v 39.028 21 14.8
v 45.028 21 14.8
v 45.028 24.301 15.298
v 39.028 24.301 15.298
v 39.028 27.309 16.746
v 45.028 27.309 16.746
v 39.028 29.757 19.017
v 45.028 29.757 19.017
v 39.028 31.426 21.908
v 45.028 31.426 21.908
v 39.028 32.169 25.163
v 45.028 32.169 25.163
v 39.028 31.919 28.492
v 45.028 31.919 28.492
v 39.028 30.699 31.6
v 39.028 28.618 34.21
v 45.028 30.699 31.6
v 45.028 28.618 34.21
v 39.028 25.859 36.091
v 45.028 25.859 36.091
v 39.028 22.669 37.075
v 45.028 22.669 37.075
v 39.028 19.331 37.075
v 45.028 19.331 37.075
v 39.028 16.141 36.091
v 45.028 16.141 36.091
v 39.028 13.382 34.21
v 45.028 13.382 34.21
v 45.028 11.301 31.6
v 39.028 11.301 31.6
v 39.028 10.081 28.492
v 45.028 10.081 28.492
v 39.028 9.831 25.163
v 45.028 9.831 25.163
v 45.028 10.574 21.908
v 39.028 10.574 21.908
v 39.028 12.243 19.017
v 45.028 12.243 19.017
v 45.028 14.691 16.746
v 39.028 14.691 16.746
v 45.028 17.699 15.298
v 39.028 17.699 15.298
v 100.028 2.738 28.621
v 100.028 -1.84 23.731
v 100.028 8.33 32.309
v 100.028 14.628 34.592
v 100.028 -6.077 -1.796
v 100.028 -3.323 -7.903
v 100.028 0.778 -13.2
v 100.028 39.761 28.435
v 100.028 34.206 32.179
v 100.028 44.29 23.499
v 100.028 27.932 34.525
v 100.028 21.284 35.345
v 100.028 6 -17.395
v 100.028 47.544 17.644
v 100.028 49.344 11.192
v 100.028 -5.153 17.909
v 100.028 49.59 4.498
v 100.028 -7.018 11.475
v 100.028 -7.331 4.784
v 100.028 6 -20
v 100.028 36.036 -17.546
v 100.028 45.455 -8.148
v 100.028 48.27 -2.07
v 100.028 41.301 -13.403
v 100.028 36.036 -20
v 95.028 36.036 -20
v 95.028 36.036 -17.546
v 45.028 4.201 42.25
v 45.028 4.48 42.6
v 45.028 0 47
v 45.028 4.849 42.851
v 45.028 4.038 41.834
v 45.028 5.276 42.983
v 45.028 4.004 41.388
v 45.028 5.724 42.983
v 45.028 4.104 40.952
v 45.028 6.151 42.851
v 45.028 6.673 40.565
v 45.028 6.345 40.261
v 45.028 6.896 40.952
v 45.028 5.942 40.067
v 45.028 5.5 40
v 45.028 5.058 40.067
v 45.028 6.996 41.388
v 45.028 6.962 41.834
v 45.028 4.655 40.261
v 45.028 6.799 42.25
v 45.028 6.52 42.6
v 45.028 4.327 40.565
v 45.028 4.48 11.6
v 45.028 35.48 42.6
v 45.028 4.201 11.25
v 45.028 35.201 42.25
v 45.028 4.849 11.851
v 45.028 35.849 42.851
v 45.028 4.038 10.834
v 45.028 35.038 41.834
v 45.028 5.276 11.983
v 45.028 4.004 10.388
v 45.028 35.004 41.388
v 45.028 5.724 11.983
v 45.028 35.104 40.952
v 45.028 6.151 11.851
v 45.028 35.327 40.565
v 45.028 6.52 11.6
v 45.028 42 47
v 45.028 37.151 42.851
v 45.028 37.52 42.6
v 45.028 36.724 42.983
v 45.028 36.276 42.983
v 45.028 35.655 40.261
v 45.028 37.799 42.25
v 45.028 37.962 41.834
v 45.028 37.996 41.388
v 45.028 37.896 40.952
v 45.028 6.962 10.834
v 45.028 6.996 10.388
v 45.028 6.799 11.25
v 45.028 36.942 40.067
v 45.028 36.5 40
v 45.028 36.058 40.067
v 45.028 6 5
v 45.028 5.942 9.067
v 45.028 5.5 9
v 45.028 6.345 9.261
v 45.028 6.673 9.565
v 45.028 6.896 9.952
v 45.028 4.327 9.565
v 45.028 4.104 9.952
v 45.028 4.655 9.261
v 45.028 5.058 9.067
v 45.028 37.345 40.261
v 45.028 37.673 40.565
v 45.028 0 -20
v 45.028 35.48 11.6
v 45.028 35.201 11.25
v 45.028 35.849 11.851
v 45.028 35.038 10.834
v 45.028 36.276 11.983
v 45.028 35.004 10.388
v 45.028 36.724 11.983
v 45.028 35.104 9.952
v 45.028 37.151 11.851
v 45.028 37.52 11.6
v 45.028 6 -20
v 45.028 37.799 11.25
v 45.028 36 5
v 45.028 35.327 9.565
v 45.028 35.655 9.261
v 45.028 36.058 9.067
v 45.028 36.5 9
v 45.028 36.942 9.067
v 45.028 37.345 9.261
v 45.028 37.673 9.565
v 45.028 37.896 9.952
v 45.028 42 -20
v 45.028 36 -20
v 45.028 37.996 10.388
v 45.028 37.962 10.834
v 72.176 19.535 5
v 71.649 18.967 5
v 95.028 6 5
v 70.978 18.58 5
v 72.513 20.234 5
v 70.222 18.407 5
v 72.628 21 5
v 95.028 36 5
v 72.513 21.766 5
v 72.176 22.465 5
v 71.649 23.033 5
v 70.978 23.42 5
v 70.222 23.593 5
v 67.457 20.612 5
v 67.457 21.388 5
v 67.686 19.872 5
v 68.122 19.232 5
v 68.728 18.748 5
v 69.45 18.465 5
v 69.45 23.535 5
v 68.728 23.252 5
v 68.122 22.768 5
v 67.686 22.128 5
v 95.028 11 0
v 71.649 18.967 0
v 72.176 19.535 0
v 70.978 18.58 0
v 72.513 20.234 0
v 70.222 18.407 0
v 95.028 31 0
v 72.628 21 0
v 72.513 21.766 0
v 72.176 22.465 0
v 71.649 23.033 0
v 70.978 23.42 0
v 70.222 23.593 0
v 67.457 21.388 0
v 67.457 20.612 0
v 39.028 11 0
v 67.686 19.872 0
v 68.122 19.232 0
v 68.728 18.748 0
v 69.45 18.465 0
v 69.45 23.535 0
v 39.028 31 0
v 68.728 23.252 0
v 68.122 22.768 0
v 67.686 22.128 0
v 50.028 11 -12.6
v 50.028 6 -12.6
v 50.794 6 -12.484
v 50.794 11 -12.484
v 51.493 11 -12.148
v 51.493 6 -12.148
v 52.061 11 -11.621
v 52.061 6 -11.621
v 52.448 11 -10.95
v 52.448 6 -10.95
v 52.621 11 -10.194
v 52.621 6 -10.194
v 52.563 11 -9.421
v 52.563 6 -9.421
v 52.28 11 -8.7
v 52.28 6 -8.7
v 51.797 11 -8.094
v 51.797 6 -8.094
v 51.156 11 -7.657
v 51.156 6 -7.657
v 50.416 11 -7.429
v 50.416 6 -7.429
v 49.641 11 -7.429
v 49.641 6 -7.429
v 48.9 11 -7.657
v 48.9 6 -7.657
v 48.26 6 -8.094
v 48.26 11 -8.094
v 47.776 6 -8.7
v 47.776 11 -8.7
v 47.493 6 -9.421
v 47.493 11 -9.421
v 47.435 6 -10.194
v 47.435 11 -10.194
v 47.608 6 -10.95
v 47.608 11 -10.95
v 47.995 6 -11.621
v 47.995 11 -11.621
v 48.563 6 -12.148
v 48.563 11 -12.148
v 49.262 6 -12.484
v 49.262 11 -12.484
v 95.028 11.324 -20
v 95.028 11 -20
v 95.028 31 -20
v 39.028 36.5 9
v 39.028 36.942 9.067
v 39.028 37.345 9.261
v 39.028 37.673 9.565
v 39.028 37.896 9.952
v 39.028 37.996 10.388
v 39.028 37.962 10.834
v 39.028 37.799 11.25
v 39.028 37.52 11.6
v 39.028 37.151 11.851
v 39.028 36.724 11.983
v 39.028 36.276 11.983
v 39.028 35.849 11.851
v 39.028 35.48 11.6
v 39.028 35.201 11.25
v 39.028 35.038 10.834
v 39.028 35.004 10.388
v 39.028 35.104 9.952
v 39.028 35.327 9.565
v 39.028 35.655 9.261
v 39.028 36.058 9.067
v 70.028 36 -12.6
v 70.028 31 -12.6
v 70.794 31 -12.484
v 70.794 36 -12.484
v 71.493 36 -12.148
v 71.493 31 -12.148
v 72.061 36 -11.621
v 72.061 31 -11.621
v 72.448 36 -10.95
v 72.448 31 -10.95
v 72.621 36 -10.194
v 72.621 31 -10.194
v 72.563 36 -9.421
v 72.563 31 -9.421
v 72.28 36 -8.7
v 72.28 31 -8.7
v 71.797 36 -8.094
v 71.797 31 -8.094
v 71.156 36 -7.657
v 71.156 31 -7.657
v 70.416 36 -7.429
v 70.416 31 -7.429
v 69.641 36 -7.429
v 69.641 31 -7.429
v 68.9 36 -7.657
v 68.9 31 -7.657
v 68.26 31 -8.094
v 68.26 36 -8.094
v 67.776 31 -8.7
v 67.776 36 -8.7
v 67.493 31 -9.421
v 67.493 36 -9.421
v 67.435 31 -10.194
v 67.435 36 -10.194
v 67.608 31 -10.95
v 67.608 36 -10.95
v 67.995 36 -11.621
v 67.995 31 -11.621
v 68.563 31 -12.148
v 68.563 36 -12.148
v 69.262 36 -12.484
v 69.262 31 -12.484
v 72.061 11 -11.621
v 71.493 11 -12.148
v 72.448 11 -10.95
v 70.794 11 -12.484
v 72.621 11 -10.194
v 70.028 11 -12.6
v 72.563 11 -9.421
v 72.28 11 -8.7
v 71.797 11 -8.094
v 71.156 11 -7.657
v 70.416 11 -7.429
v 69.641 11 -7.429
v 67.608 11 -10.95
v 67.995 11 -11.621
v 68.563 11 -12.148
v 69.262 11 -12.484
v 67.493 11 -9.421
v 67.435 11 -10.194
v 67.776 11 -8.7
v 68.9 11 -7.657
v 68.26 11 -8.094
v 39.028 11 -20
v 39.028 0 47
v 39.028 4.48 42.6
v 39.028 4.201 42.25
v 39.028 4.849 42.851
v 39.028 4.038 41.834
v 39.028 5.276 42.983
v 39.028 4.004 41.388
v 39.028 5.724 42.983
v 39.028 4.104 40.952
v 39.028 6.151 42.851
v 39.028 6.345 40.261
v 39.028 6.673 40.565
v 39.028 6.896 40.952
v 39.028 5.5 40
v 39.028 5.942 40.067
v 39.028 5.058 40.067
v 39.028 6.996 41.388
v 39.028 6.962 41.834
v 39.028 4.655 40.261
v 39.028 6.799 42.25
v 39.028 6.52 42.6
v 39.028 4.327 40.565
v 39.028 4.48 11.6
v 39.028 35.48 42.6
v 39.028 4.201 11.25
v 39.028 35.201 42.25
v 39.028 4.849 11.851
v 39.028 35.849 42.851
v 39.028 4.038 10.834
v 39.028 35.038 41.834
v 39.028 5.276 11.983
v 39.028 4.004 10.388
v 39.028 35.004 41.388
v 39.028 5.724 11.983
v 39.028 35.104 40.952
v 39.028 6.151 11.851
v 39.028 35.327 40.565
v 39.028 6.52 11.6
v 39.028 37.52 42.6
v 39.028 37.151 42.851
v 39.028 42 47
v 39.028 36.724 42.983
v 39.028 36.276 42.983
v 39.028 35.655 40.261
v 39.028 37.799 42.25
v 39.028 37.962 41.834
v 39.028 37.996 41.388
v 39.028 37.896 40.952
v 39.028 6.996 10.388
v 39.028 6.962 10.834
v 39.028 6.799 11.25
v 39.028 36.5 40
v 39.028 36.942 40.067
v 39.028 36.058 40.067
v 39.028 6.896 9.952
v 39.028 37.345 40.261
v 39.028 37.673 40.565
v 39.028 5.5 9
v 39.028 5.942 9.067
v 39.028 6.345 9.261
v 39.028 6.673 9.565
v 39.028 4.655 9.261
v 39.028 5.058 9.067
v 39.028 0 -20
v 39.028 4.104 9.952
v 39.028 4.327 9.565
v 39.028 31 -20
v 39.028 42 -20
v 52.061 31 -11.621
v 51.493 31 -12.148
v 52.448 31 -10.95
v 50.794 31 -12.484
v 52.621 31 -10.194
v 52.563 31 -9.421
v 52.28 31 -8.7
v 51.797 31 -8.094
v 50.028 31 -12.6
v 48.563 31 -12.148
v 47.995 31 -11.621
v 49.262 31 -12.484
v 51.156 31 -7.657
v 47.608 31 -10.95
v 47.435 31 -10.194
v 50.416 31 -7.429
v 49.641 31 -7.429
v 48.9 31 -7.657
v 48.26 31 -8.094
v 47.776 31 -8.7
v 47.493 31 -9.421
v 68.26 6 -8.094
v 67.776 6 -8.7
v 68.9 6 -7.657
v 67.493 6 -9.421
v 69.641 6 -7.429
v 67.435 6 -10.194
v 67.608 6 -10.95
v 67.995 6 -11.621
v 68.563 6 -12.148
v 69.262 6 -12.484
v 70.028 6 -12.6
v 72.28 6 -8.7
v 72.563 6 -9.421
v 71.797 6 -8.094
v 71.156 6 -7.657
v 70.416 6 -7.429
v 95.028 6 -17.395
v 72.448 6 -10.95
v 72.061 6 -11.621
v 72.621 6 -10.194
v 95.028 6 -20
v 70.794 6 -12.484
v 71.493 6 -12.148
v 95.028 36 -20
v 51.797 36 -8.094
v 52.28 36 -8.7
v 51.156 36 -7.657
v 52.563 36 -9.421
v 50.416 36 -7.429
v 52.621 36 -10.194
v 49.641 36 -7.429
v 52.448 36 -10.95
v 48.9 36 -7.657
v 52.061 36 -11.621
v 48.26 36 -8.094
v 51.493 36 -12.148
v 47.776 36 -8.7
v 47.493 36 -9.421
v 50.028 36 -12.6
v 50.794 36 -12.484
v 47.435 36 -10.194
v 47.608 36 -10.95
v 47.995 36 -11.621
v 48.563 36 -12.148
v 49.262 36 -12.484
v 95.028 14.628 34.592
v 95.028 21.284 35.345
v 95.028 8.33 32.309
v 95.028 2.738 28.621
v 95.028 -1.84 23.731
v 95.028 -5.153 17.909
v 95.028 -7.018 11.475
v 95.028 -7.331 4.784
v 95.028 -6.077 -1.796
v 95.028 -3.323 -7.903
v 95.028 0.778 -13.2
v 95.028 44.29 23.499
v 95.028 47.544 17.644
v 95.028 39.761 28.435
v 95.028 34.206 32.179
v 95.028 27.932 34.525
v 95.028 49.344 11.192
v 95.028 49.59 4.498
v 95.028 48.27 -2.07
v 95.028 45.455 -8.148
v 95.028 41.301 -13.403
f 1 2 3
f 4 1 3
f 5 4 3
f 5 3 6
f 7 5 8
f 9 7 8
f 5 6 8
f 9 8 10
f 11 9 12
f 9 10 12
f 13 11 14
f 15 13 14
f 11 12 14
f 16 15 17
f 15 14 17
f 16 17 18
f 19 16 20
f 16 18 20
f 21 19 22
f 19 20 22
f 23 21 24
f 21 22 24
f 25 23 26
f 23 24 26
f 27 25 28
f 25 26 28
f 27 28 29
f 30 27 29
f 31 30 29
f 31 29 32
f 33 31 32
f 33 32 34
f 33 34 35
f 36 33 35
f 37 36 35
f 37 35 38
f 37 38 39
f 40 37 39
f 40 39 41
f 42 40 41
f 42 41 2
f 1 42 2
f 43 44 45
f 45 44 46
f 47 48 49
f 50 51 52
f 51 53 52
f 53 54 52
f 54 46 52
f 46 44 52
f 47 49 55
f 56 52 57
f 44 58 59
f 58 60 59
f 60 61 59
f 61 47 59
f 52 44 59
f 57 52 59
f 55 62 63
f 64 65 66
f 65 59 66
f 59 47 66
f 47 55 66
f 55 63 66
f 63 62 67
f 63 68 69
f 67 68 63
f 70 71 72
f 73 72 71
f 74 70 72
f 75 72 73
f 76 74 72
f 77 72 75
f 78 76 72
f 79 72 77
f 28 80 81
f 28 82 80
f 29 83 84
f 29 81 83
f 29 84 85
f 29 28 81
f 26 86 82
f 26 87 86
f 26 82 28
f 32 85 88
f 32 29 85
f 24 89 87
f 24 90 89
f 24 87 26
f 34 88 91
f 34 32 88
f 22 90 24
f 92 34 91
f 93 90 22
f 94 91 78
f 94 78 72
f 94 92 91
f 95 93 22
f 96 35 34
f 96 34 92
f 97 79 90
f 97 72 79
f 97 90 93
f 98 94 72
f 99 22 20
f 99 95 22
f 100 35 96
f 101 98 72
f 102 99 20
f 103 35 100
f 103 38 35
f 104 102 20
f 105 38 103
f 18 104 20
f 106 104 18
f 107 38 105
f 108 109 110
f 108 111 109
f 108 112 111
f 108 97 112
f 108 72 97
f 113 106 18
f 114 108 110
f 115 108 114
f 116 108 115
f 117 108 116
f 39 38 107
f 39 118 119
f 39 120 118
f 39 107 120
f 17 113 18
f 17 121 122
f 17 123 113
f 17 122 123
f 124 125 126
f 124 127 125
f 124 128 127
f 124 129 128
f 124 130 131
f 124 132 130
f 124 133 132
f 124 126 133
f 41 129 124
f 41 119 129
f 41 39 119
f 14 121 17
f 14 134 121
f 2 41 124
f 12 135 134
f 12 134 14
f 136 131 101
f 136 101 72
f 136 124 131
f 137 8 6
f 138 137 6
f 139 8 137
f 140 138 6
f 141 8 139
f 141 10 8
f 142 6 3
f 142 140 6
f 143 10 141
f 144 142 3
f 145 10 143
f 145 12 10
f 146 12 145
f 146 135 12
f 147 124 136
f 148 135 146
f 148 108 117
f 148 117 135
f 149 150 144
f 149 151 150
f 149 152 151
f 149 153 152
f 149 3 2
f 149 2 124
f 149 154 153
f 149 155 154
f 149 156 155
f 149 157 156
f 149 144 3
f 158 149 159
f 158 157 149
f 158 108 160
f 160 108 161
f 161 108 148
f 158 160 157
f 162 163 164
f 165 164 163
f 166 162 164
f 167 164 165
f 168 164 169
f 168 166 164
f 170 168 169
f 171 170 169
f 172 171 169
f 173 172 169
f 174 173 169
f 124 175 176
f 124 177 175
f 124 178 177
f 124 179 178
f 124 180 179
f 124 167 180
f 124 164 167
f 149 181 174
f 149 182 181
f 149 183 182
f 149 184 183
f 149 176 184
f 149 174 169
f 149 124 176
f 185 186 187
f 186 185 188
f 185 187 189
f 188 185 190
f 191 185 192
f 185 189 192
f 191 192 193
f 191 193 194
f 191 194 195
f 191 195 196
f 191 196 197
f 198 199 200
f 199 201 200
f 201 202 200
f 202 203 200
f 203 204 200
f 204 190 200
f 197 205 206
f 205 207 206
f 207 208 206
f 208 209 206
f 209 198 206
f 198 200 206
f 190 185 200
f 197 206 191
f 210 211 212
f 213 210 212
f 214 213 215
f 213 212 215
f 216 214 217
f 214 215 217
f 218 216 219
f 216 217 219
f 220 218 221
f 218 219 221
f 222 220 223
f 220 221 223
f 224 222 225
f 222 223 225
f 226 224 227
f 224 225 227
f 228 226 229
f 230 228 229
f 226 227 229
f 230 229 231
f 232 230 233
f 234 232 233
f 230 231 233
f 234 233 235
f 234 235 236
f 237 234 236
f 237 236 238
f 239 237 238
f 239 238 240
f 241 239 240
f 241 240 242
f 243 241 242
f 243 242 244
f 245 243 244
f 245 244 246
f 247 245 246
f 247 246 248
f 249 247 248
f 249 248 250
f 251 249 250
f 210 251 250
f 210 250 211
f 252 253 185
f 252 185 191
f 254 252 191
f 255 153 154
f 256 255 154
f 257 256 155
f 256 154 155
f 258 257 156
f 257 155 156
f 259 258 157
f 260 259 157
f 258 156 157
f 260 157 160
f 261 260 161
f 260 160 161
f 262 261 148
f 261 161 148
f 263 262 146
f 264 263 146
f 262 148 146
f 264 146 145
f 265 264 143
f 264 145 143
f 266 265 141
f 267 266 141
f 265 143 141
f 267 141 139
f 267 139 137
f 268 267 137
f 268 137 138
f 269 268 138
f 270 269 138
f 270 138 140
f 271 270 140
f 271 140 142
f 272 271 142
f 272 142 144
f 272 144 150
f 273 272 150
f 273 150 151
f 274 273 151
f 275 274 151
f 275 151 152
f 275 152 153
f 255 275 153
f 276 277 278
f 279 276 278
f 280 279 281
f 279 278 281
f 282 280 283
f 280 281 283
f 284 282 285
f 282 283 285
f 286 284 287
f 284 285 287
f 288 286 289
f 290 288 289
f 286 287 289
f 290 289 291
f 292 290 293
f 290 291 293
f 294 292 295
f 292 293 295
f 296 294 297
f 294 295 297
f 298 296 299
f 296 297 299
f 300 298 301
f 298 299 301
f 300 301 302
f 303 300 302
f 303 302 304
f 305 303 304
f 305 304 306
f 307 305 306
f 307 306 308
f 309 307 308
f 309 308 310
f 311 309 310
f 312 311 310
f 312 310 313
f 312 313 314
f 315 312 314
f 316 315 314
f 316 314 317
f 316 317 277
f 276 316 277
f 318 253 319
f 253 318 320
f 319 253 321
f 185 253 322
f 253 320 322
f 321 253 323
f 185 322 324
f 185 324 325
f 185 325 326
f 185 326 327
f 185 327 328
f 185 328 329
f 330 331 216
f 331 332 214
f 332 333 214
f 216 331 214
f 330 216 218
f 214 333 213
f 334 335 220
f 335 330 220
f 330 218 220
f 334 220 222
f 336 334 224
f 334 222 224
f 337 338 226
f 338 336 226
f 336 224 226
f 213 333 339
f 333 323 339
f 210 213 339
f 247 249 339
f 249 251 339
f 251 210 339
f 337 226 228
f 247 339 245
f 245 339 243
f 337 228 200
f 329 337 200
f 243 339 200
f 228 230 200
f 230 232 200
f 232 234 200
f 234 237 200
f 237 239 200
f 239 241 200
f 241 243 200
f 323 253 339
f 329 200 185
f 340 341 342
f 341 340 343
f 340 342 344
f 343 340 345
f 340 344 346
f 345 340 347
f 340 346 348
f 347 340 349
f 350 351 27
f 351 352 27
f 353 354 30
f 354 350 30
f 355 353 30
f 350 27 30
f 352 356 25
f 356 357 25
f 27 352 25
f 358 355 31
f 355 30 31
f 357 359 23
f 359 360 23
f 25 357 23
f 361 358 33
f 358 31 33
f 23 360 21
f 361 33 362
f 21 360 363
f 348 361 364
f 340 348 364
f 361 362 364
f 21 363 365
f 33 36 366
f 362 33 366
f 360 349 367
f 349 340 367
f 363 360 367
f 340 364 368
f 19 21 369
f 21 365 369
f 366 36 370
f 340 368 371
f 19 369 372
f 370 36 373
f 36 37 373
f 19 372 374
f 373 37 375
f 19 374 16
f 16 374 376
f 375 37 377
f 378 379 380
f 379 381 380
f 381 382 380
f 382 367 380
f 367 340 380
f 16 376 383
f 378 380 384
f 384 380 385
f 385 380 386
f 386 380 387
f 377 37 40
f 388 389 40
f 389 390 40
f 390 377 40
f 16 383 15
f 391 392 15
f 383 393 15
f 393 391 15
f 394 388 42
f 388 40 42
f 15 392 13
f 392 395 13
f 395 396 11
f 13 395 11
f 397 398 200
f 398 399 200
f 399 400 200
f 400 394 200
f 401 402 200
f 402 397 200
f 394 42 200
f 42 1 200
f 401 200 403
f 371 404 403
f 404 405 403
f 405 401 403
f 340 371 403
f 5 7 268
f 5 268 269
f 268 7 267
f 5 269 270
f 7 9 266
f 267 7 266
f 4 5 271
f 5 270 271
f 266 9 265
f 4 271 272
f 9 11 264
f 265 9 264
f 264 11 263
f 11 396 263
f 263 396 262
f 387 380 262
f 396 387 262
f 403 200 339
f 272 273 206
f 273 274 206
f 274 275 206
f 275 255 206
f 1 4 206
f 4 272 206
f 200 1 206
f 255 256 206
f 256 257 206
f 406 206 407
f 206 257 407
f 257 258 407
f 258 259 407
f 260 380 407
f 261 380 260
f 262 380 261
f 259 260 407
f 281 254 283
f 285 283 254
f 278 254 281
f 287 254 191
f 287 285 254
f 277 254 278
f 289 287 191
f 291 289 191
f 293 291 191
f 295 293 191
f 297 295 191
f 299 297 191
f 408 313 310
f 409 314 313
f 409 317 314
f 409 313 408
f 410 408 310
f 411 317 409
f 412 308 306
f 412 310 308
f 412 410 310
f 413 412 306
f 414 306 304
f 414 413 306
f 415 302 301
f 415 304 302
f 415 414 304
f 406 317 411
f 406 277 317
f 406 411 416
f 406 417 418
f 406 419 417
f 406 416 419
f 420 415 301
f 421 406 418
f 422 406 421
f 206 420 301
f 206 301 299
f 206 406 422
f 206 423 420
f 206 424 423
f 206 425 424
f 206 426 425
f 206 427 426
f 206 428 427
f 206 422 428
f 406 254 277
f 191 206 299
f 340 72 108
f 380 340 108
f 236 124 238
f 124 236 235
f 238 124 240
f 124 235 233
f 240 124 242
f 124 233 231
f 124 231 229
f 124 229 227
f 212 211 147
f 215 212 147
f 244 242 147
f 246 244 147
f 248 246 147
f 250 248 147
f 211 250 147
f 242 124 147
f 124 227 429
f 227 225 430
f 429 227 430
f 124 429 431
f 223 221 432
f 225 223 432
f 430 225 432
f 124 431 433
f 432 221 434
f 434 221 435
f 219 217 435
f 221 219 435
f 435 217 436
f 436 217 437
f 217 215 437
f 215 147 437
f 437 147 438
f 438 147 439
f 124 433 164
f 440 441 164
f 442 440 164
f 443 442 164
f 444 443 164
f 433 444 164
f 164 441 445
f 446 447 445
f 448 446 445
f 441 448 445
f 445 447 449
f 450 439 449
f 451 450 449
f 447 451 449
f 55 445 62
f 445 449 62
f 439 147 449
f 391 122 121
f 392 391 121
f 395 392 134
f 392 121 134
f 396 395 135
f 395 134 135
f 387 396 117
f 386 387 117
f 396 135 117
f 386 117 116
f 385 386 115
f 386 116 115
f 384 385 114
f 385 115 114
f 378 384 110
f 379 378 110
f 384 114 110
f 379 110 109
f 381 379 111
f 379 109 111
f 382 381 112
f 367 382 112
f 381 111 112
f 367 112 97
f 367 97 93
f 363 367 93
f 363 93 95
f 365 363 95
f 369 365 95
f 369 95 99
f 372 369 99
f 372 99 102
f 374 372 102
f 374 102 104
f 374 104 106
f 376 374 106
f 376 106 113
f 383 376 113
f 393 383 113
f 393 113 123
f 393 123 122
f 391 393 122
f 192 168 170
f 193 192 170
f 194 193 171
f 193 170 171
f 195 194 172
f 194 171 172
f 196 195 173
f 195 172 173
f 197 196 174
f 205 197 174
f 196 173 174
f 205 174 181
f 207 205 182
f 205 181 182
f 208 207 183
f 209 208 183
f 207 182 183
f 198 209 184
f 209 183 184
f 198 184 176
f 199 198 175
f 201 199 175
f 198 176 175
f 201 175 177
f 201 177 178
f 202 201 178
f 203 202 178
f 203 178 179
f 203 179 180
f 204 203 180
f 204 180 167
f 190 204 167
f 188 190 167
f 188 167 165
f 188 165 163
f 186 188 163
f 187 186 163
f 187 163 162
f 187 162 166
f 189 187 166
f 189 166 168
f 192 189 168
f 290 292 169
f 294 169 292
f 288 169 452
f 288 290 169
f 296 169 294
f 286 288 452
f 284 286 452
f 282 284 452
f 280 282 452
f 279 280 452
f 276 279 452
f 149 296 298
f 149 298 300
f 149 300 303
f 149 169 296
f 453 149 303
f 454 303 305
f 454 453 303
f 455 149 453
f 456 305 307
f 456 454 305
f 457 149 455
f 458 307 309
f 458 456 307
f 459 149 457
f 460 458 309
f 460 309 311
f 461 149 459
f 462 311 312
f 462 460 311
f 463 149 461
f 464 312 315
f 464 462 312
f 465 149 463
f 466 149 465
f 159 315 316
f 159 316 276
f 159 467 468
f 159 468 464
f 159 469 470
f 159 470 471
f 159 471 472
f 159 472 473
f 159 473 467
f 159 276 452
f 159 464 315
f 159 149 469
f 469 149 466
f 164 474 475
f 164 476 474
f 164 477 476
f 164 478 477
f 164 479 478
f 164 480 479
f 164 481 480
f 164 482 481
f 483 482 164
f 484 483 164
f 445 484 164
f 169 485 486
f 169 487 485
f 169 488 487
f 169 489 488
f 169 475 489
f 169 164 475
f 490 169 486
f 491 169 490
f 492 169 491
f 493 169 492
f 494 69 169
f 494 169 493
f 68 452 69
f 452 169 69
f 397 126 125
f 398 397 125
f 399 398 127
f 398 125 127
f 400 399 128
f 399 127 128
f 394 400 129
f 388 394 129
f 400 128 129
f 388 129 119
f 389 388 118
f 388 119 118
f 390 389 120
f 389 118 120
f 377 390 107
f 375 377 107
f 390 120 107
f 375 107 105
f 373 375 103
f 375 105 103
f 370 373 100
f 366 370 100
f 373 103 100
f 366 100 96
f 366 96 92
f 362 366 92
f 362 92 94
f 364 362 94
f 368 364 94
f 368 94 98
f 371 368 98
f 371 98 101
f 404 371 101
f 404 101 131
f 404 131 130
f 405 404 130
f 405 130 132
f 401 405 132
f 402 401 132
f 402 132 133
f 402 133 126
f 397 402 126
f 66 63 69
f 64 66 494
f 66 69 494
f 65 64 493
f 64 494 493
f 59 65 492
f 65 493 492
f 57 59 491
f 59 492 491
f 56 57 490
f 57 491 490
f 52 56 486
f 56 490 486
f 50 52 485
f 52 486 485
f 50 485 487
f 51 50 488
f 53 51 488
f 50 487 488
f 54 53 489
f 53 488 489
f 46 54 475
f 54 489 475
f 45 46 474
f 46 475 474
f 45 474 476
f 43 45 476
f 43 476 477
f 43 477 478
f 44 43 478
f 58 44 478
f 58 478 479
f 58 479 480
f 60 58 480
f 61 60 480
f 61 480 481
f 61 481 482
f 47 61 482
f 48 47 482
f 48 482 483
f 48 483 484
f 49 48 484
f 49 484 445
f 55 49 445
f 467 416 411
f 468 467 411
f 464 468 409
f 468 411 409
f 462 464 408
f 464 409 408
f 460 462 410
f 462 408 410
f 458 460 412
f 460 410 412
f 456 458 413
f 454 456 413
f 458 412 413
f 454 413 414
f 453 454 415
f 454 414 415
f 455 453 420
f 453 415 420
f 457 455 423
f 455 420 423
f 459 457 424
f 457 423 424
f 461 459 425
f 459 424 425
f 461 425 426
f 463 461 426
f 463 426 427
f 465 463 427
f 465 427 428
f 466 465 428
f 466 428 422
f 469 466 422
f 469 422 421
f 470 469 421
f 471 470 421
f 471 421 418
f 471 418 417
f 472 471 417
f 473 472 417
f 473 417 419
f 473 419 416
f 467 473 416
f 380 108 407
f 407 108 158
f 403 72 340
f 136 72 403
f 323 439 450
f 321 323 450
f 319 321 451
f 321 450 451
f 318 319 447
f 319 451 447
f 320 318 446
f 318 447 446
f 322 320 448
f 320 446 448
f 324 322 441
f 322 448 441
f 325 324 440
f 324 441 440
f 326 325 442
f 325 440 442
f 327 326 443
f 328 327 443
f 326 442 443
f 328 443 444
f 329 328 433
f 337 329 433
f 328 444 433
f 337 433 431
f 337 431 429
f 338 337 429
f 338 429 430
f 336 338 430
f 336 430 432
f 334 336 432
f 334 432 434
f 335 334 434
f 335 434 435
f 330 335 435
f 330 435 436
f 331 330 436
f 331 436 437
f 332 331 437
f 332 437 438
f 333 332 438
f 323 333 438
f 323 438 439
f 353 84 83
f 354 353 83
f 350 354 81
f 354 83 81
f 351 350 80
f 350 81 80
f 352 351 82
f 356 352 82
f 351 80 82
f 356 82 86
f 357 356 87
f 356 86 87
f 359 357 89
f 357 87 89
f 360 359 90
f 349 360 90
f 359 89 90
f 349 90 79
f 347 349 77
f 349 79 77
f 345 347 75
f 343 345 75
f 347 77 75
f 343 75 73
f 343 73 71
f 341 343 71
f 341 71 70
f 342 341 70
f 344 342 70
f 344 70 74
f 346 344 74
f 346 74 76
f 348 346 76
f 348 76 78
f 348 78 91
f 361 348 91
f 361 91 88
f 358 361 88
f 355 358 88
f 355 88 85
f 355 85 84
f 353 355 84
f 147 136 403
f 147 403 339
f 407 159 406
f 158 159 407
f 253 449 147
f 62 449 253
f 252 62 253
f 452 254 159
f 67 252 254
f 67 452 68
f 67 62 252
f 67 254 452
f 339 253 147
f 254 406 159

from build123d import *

# Parameters (mm, degrees)
SKETCH1_W           = 67
SKETCH1_H           = 41.999999434
BOSS_EXTRUDE1_DEPTH = 6.000000983
SKETCH2_W           = 24.999999441
SKETCH2_H           = 29.999998398
BOSS_EXTRUDE2_DEPTH = 50
SKETCH3_W           = 19.999999553
SKETCH3_H           = 19.999999553
CUT_EXTRUDE1_DEPTH  = 85.314886613
SKETCH14_R          = 11.2
CUT_EXTRUDE12_DEPTH = 10
SKETCH15_R          = 2.6
CUT_EXTRUDE13_DEPTH = 112.961295121
SKETCH18_R          = 1.5
CUT_EXTRUDE14_DEPTH = 81.454956308
SKETCH19_R          = 2.6
CUT_EXTRUDE15_DEPTH = 113.063962124
SKETCH20_R          = 28.543107088
BOSS_EXTRUDE3_DEPTH = 5
BOSS_EXTRUDE4_REACH = 132.242
SKETCH21_W          = 30.03647221
SKETCH21_H          = 5
SKETCH22_W          = 8.074560758
SKETCH22_H          = 29.943227156
CUT_EXTRUDE16_DEPTH = 10


with BuildPart() as part:
    # Sketch1 → Boss-Extrude1 (new body)
    with BuildSketch(Plane(origin=(45.028056949, 0, 0), x_dir=(0, 0, -1), z_dir=(1, 0, 0))):
        with Locations((-13.500000447, 20.999999717)):
            Rectangle(SKETCH1_W, SKETCH1_H)
    extrude(amount=-BOSS_EXTRUDE1_DEPTH)

    # Sketch2 → Boss-Extrude2 (add)
    with BuildSketch(Plane(origin=(45.028056949, 0, 0), x_dir=(0, 0, -1), z_dir=(1, 0, 0))):
        with Locations((7.499999833, 20.999999251)):
            Rectangle(SKETCH2_W, SKETCH2_H)
    extrude(amount=BOSS_EXTRUDE2_DEPTH)

    # Sketch3 → Cut-Extrude1 (cut, through all)
    with BuildSketch(Plane.ZY.offset(-39.028055966)):
        with Locations((-9.999999777, 20.999999716)):
            Rectangle(SKETCH3_W, SKETCH3_H)
    extrude(amount=-CUT_EXTRUDE1_DEPTH, mode=Mode.SUBTRACT)

    # Sketch14 → Cut-Extrude12 (cut)
    with BuildSketch(Plane(origin=(45.028056949, 0, 0), x_dir=(0, 0, -1), z_dir=(1, 0, 0))):
        with Locations((-25.999999888, 20.999999251)):
            Circle(SKETCH14_R)
    extrude(amount=-CUT_EXTRUDE12_DEPTH, mode=Mode.SUBTRACT)

    # Sketch15 → Cut-Extrude13 (cut, through all)
    with BuildSketch(Plane(origin=(0, 6.000000052, 0), x_dir=(-1, 0, 0), z_dir=(0, -1, 0))):
        with Locations(Location((-50.028056949, 9.999999553, 0), (0, 0, 90))):
            Circle(SKETCH15_R)
        with Locations(Location((-70.028056949, 9.999999553, 0), (0, 0, 90))):
            Circle(SKETCH15_R)
    extrude(amount=-CUT_EXTRUDE13_DEPTH, mode=Mode.SUBTRACT)

    # Sketch18 → Cut-Extrude14 (cut, through all)
    with BuildSketch(Plane(origin=(45.028056949, 0, 0), x_dir=(0, 0, -1), z_dir=(1, 0, 0))):
        with Locations((-10.499999888, 36.499999251)):
            Circle(SKETCH18_R)
        with Locations((-10.499999888, 5.499999251)):
            Circle(SKETCH18_R)
        with Locations((-41.499999888, 5.499999251)):
            Circle(SKETCH18_R)
        with Locations((-41.499999888, 36.499999251)):
            Circle(SKETCH18_R)
    extrude(amount=-CUT_EXTRUDE14_DEPTH, mode=Mode.SUBTRACT)

    # Sketch19 → Cut-Extrude15 (cut, through all)
    with BuildSketch(Plane.XY.offset(4.999999888)):
        with Locations((70.028056949, 20.999999251)):
            Circle(SKETCH19_R)
    extrude(amount=-CUT_EXTRUDE15_DEPTH, mode=Mode.SUBTRACT)

    # Sketch20 → Boss-Extrude3 (add)
    with BuildSketch(Plane(origin=(95.028056949, 0, 0), x_dir=(0, 0, -1), z_dir=(1, 0, 0))):
        with Locations(Location((-6.802134848, 21.140269153, 0), (0, 0, 327.965134835))):
            Circle(SKETCH20_R)
    extrude(amount=BOSS_EXTRUDE3_DEPTH)

    # Sketch21 → Boss-Extrude4 (add, up to next)
    with BuildSketch(Plane.YX.offset(19.999999553), mode=Mode.PRIVATE) as boss_extrude4_sk1:
        with Locations((21.018236157, 97.528056949)):
            Rectangle(SKETCH21_W, SKETCH21_H)
    boss_extrude4_tool1 = extrude(boss_extrude4_sk1.sketch, amount=-BOSS_EXTRUDE4_REACH, mode=Mode.PRIVATE) - part.part
    add(boss_extrude4_tool1.solids().sort_by_distance((97.528057, 21.018236, -20))[0])
    add(boss_extrude4_tool1.solids().sort_by_distance((97.528057, 21.018236, -20))[1])

    # Sketch22 → Cut-Extrude16 (cut)
    with BuildSketch(Plane(origin=(100.028056949, 0, 0), x_dir=(0, 0, -1), z_dir=(1, 0, 0))):
        with Locations((24.037279932, 20.970137181)):
            Rectangle(SKETCH22_W, SKETCH22_H)
    extrude(amount=-CUT_EXTRUDE16_DEPTH, mode=Mode.SUBTRACT)


solid = part.part
